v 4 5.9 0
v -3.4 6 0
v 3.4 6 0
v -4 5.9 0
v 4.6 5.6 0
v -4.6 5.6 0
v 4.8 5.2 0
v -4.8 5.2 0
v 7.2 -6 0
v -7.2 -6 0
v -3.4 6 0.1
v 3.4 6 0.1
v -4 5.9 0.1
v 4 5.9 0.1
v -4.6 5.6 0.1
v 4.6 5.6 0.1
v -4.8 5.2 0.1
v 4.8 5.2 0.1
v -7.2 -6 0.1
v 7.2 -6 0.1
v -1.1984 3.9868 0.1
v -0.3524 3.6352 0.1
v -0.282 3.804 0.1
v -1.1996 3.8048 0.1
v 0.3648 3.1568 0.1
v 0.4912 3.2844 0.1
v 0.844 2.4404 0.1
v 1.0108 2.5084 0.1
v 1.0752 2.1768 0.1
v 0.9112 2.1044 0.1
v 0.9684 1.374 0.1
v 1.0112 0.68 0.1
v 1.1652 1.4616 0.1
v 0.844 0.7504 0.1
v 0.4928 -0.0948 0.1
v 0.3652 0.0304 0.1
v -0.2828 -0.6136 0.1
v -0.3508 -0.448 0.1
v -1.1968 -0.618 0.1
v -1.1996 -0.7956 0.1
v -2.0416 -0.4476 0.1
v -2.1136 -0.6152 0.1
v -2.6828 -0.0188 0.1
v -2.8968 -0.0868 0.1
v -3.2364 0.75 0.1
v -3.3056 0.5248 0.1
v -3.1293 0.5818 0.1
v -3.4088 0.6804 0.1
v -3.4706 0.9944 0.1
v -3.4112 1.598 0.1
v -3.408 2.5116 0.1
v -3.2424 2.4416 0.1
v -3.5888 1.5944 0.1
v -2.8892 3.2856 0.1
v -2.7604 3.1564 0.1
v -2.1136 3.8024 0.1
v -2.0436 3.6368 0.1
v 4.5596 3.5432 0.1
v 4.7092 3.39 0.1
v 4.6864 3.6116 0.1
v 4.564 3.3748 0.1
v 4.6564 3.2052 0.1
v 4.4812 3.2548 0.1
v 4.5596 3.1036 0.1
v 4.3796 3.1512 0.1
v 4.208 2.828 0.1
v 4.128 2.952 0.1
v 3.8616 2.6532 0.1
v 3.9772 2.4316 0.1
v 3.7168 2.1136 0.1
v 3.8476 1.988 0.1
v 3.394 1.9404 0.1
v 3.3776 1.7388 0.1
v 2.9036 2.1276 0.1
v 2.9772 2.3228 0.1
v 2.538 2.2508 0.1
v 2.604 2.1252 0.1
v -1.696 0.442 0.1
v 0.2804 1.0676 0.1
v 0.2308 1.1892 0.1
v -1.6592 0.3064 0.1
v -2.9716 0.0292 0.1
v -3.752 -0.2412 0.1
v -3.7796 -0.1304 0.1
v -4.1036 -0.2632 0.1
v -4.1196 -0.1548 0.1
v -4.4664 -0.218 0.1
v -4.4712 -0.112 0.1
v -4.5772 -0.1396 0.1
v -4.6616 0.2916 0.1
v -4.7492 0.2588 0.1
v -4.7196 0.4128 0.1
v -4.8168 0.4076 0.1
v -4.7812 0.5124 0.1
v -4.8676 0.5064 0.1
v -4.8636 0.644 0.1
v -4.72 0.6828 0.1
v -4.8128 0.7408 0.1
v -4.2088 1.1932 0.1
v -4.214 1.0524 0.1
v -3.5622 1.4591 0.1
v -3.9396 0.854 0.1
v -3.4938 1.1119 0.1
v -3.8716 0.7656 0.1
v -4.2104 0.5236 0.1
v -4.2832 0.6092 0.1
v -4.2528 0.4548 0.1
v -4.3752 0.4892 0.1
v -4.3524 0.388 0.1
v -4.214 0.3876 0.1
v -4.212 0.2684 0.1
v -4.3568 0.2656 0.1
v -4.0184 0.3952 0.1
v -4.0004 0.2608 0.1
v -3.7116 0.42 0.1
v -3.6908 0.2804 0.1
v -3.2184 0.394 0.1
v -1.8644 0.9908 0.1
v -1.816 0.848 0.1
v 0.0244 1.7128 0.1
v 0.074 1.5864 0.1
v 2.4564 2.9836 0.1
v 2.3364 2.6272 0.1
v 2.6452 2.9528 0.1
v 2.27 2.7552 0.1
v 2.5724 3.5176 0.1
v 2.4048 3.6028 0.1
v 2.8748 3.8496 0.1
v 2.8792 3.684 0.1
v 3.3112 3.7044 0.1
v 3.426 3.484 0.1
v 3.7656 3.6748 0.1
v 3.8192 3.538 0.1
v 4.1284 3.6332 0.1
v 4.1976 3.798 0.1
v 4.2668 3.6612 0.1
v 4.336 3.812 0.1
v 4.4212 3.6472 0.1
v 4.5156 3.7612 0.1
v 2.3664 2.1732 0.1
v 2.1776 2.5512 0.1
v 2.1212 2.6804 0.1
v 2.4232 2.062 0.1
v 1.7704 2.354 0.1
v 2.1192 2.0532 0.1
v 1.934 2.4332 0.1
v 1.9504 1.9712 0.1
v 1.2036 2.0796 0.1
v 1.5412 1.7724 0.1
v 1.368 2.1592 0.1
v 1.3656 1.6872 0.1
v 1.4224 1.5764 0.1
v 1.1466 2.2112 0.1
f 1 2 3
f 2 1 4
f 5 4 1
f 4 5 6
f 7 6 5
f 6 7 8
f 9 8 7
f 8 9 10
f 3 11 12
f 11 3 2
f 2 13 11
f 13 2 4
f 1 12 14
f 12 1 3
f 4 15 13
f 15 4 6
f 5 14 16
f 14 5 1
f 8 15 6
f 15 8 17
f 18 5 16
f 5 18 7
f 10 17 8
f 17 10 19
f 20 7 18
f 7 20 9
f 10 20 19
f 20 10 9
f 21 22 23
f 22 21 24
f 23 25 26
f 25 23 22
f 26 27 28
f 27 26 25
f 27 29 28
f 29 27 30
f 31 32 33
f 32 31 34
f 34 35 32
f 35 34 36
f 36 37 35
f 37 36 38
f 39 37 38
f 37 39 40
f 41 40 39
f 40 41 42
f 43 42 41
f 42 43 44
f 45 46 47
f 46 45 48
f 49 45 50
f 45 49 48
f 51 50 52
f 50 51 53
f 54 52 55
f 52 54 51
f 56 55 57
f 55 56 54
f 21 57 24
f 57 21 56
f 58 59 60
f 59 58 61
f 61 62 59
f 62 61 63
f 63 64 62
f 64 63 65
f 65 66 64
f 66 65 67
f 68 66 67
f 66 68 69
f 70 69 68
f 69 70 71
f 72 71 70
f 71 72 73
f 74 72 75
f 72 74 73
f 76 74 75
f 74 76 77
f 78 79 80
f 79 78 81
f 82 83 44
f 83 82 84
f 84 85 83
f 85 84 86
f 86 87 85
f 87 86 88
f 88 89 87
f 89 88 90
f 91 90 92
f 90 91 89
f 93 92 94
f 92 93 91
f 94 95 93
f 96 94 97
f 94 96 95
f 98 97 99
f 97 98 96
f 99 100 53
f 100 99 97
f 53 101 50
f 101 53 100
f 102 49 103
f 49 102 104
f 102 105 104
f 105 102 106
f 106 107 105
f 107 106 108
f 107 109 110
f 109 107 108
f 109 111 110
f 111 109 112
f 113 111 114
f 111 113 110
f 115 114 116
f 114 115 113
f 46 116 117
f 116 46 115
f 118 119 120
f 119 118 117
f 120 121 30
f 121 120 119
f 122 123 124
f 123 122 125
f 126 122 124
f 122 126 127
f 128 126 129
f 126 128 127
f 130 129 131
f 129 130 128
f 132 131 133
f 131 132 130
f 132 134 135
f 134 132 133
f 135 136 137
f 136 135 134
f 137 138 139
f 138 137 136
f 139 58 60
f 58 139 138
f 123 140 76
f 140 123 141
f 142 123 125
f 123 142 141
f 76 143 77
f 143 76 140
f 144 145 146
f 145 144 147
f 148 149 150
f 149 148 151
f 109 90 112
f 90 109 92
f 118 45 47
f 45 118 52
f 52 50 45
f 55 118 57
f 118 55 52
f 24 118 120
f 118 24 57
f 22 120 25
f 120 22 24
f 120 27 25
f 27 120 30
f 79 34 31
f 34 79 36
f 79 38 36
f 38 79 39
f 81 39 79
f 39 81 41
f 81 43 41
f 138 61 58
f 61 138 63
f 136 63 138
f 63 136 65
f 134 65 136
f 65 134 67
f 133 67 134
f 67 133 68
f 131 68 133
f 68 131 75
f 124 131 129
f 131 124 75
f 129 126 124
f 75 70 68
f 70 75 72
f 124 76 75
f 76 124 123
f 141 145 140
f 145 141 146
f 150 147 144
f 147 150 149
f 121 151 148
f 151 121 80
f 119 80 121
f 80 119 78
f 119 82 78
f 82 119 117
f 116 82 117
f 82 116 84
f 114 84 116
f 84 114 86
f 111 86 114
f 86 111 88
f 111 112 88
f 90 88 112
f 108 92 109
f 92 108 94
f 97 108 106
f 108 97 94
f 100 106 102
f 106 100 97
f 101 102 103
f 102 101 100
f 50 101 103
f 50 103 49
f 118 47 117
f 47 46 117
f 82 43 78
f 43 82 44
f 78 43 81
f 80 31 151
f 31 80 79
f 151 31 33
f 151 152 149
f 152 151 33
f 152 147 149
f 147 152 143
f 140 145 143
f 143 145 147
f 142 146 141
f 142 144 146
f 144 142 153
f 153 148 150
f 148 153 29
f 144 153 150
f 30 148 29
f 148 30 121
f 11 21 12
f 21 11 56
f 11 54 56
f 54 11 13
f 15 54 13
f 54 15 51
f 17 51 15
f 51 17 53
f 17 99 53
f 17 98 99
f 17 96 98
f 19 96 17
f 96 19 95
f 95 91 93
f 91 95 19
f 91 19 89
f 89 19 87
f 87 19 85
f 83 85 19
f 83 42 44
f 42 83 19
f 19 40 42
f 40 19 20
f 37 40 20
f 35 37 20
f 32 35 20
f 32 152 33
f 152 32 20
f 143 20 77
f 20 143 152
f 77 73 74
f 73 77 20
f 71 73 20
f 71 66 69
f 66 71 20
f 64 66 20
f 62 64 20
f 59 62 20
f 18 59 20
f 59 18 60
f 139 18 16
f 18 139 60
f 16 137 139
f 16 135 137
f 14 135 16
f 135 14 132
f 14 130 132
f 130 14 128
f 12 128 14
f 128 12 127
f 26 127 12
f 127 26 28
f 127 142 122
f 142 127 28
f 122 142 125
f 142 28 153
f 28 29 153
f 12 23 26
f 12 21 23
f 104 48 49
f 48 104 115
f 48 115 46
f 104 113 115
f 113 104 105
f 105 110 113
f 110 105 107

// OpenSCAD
// file: s/004315s01.scad
use <../../lib.scad>
function ldraw_lib__s__004315s01() = [
// 0 ~Sticker for Minifig Torso without Top Surface
// 0 Name: s\004315s01.dat
// 0 Author: Michael Heidemann [mikeheide]
// 0 !LDRAW_ORG Subpart UPDATE 2018-02
// 0 !LICENSE Licensed under CC BY 2.0 and CC BY 4.0 : see CAreadme.txt
// 
// 0 BFC CERTIFY CCW
  [0,"BFC","CERTIFY"],
  [0,"BFC","CCW"],
// 
// 0 !HISTORY 2011-12-29 [PTadmin] Official Update 2011-02
// 0 !HISTORY 2017-07-04 [cwdee] Add conditional lines in border
// 0 !HISTORY 2018-12-08 [PTadmin] Official Update 2018-02
// 
// 
// 0 // Back
// 
// 4 16 8.5 0 15 10 0 14.75 -10 0 14.75 -8.5 0 15
  [4,16,8.5,0,15,10,0,14.75,-10,0,14.75,-8.5,0,15],
// 4 16 10 0 14.75 11.5 0 14 -11.5 0 14 -10 0 14.75
  [4,16,10,0,14.75,11.5,0,14,-11.5,0,14,-10,0,14.75],
// 4 16 11.5 0 14 12 0 13 -12 0 13 -11.5 0 14
  [4,16,11.5,0,14,12,0,13,-12,0,13,-11.5,0,14],
// 4 16 12 0 13 18 0 -15 -18 0 -15 -12 0 13
  [4,16,12,0,13,18,0,-15,-18,0,-15,-12,0,13],
// 0 // Border
// 4 16 8.5 0 15 -8.5 0 15 -8.5 -0.25 15 8.5 -0.25 15
  [4,16,8.5,0,15,-8.5,0,15,-8.5,-0.25,15,8.5,-0.25,15],
// 4 16 -8.5 0 15 -10 0 14.75 -10 -0.25 14.75 -8.5 -0.25 15
  [4,16,-8.5,0,15,-10,0,14.75,-10,-0.25,14.75,-8.5,-0.25,15],
// 4 16 8.5 -0.25 15 10 -0.25 14.75 10 0 14.75 8.5 0 15
  [4,16,8.5,-0.25,15,10,-0.25,14.75,10,0,14.75,8.5,0,15],
// 4 16 -10 0 14.75 -11.5 0 14 -11.5 -0.25 14 -10 -0.25 14.75
  [4,16,-10,0,14.75,-11.5,0,14,-11.5,-0.25,14,-10,-0.25,14.75],
// 4 16 10 -0.25 14.75 11.5 -0.25 14 11.5 0 14 10 0 14.75
  [4,16,10,-0.25,14.75,11.5,-0.25,14,11.5,0,14,10,0,14.75],
// 4 16 -11.5 0 14 -12 0 13 -12 -0.25 13 -11.5 -0.25 14
  [4,16,-11.5,0,14,-12,0,13,-12,-0.25,13,-11.5,-0.25,14],
// 4 16 11.5 -0.25 14 12 -0.25 13 12 0 13 11.5 0 14
  [4,16,11.5,-0.25,14,12,-0.25,13,12,0,13,11.5,0,14],
// 4 16 -18 -0.25 -15 -12 -0.25 13 -12 0 13 -18 0 -15
  [4,16,-18,-0.25,-15,-12,-0.25,13,-12,0,13,-18,0,-15],
// 4 16 18 0 -15 12 0 13 12 -0.25 13 18 -0.25 -15
  [4,16,18,0,-15,12,0,13,12,-0.25,13,18,-0.25,-15],
// 4 16 -18 0 -15 18 0 -15 18 -0.25 -15 -18 -0.25 -15
  [4,16,-18,0,-15,18,0,-15,18,-0.25,-15,-18,-0.25,-15],
// 0 // Border conditional lines
// 5 24 8.5 0 15 8.5 -0.25 15 0 0 15 10 0 14.75
  [5,24,8.5,0,15,8.5,-0.25,15,0,0,15,10,0,14.75],
// 5 24 10 0 14.75 10 -0.25 14.75 8.5 0 15 11.5 0 14
  [5,24,10,0,14.75,10,-0.25,14.75,8.5,0,15,11.5,0,14],
// 5 24 11.5 0 14 11.5 -0.25 14 10 0 14.75 12 0 13
  [5,24,11.5,0,14,11.5,-0.25,14,10,0,14.75,12,0,13],
// 5 24 12 0 13 12 -0.25 13 11.5 0 14 18 0 -15
  [5,24,12,0,13,12,-0.25,13,11.5,0,14,18,0,-15],
// 5 24 -8.5 0 15 -8.5 -0.25 15 0 0 15 -10 0 14.75
  [5,24,-8.5,0,15,-8.5,-0.25,15,0,0,15,-10,0,14.75],
// 5 24 -10 0 14.75 -10 -0.25 14.75 -8.5 0 15 -11.5 0 14
  [5,24,-10,0,14.75,-10,-0.25,14.75,-8.5,0,15,-11.5,0,14],
// 5 24 -11.5 0 14 -11.5 -0.25 14 -10 0 14.75 -12 0 13
  [5,24,-11.5,0,14,-11.5,-0.25,14,-10,0,14.75,-12,0,13],
// 5 24 -12 0 13 -12 -0.25 13 -11.5 0 14 -18 0 -15
  [5,24,-12,0,13,-12,-0.25,13,-11.5,0,14,-18,0,-15],
];
makepoly(ldraw_lib__s__004315s01(), line=0.2);
// main file
use <../lib.scad>
use <s/004315s01.scad>
function ldraw_lib__199014a() = [
// 0 Sticker Minifig Torso with Classic Space Logo on Red Background
// 0 Name: 199014a.dat
// 0 Author: Takeshi Takahashi [RainbowDolphin]
// 0 !LDRAW_ORG Part UPDATE 2022-01
// 0 !LICENSE Licensed under CC BY 2.0 and CC BY 4.0 : see CAreadme.txt
// 
// 0 BFC CERTIFY CCW
  [0,"BFC","CERTIFY"],
  [0,"BFC","CCW"],
// 
// 0 !KEYWORDS Set 926
// 
// 0 !HISTORY 2022-01-14 [PTadmin] Official Update 2022-01
// 
// 
// 1 16 0 0 0 1 0 0 0 1 0 0 0 1 s\004315s01.dat
  [1,16,0,0,0,1,0,0,0,1,0,0,0,1, ldraw_lib__s__004315s01()],
// 4 15 -.881 -.25 9.088 -.705 -.25 9.51 -2.996 -.25 9.967 -2.999 -.25 9.512
  [4,15,-.881,-.25,9.088,-.705,-.25,9.51,-2.996,-.25,9.967,-2.999,-.25,9.512],
// 4 15 .912 -.25 7.892 1.228 -.25 8.211 -.705 -.25 9.51 -.881 -.25 9.088
  [4,15,.912,-.25,7.892,1.228,-.25,8.211,-.705,-.25,9.51,-.881,-.25,9.088],
// 4 15 2.11 -.25 6.101 2.527 -.25 6.271 1.228 -.25 8.211 .912 -.25 7.892
  [4,15,2.11,-.25,6.101,2.527,-.25,6.271,1.228,-.25,8.211,.912,-.25,7.892],
// 4 15 2.278 -.25 5.261 2.688 -.25 5.442 2.527 -.25 6.271 2.11 -.25 6.101
  [4,15,2.278,-.25,5.261,2.688,-.25,5.442,2.527,-.25,6.271,2.11,-.25,6.101],
// 4 15 2.11 -.25 1.876 2.528 -.25 1.7 2.913 -.25 3.654 2.421 -.25 3.435
  [4,15,2.11,-.25,1.876,2.528,-.25,1.7,2.913,-.25,3.654,2.421,-.25,3.435],
// 4 15 1.232 -.25 -.237 2.528 -.25 1.7 2.11 -.25 1.876 .913 -.25 .076
  [4,15,1.232,-.25,-.237,2.528,-.25,1.7,2.11,-.25,1.876,.913,-.25,.076],
// 4 15 -.707 -.25 -1.534 1.232 -.25 -.237 .913 -.25 .076 -.877 -.25 -1.12
  [4,15,-.707,-.25,-1.534,1.232,-.25,-.237,.913,-.25,.076,-.877,-.25,-1.12],
// 4 15 -2.999 -.25 -1.989 -.707 -.25 -1.534 -.877 -.25 -1.12 -2.992 -.25 -1.545
  [4,15,-2.999,-.25,-1.989,-.707,-.25,-1.534,-.877,-.25,-1.12,-2.992,-.25,-1.545],
// 4 15 -2.999 -.25 -1.989 -2.992 -.25 -1.545 -5.104 -.25 -1.119 -5.284 -.25 -1.538
  [4,15,-2.999,-.25,-1.989,-2.992,-.25,-1.545,-5.104,-.25,-1.119,-5.284,-.25,-1.538],
// 4 15 -5.284 -.25 -1.538 -5.104 -.25 -1.119 -6.707 -.25 -.047 -7.242 -.25 -.217
  [4,15,-5.284,-.25,-1.538,-5.104,-.25,-1.119,-6.707,-.25,-.047,-7.242,-.25,-.217],
// 4 15 -8.264 -.25 1.312 -7.8232 -.25 1.4545 -8.091 -.25 1.875 -8.522 -.25 1.701
  [4,15,-8.264,-.25,1.312,-7.8232,-.25,1.4545,-8.091,-.25,1.875,-8.522,-.25,1.701],
// 4 15 -8.522 -.25 1.701 -8.091 -.25 1.875 -8.528 -.25 3.995 -8.6766 -.25 2.4859
  [4,15,-8.522,-.25,1.701,-8.091,-.25,1.875,-8.528,-.25,3.995,-8.6766,-.25,2.4859],
// 4 15 -8.528 -.25 3.995 -8.106 -.25 6.104 -8.52 -.25 6.279 -8.972 -.25 3.986
  [4,15,-8.528,-.25,3.995,-8.106,-.25,6.104,-8.52,-.25,6.279,-8.972,-.25,3.986],
// 4 15 -8.106 -.25 6.104 -6.901 -.25 7.891 -7.223 -.25 8.214 -8.52 -.25 6.279
  [4,15,-8.106,-.25,6.104,-6.901,-.25,7.891,-7.223,-.25,8.214,-8.52,-.25,6.279],
// 4 15 -6.901 -.25 7.891 -5.109 -.25 9.092 -5.284 -.25 9.506 -7.223 -.25 8.214
  [4,15,-6.901,-.25,7.891,-5.109,-.25,9.092,-5.284,-.25,9.506,-7.223,-.25,8.214],
// 4 15 -5.109 -.25 9.092 -2.999 -.25 9.512 -2.996 -.25 9.967 -5.284 -.25 9.506
  [4,15,-5.109,-.25,9.092,-2.999,-.25,9.512,-2.996,-.25,9.967,-5.284,-.25,9.506],
// 4 15 11.41 -.25 8.437 11.773 -.25 8.475 11.716 -.25 9.029 11.399 -.25 8.858
  [4,15,11.41,-.25,8.437,11.773,-.25,8.475,11.716,-.25,9.029,11.399,-.25,8.858],
// 4 15 11.203 -.25 8.137 11.641 -.25 8.013 11.773 -.25 8.475 11.41 -.25 8.437
  [4,15,11.203,-.25,8.137,11.641,-.25,8.013,11.773,-.25,8.475,11.41,-.25,8.437],
// 4 15 11.399 -.25 7.759 11.641 -.25 8.013 11.203 -.25 8.137 10.949 -.25 7.878
  [4,15,11.399,-.25,7.759,11.641,-.25,8.013,11.203,-.25,8.137,10.949,-.25,7.878],
// 4 15 10.52 -.25 7.07 11.399 -.25 7.759 10.949 -.25 7.878 10.32 -.25 7.38
  [4,15,10.52,-.25,7.07,11.399,-.25,7.759,10.949,-.25,7.878,10.32,-.25,7.38],
// 4 15 9.943 -.25 6.079 10.52 -.25 7.07 10.32 -.25 7.38 9.654 -.25 6.633
  [4,15,9.943,-.25,6.079,10.52,-.25,7.07,10.32,-.25,7.38,9.654,-.25,6.633],
// 4 15 9.619 -.25 4.97 9.943 -.25 6.079 9.654 -.25 6.633 9.292 -.25 5.284
  [4,15,9.619,-.25,4.97,9.943,-.25,6.079,9.654,-.25,6.633,9.292,-.25,5.284],
// 4 15 8.444 -.25 4.347 9.619 -.25 4.97 9.292 -.25 5.284 8.485 -.25 4.851
  [4,15,8.444,-.25,4.347,9.619,-.25,4.97,9.292,-.25,5.284,8.485,-.25,4.851],
// 4 15 8.444 -.25 4.347 8.485 -.25 4.851 7.443 -.25 5.807 7.259 -.25 5.319
  [4,15,8.444,-.25,4.347,8.485,-.25,4.851,7.443,-.25,5.807,7.259,-.25,5.319],
// 4 15 6.51 -.25 5.313 7.259 -.25 5.319 7.443 -.25 5.807 6.345 -.25 5.627
  [4,15,6.51,-.25,5.313,7.259,-.25,5.319,7.443,-.25,5.807,6.345,-.25,5.627],
// 4 15 -4.148 -.25 .766 .701 -.25 2.669 .577 -.25 2.973 -4.24 -.25 1.105
  [4,15,-4.148,-.25,.766,.701,-.25,2.669,.577,-.25,2.973,-4.24,-.25,1.105],
// 4 15 -9.38 -.25 -.603 -7.242 -.25 -.217 -7.429 -.25 .073 -9.449 -.25 -.326
  [4,15,-9.38,-.25,-.603,-7.242,-.25,-.217,-7.429,-.25,.073,-9.449,-.25,-.326],
// 4 15 -10.259 -.25 -.658 -9.38 -.25 -.603 -9.449 -.25 -.326 -10.299 -.25 -.387
  [4,15,-10.259,-.25,-.658,-9.38,-.25,-.603,-9.449,-.25,-.326,-10.299,-.25,-.387],
// 4 15 -10.259 -.25 -.658 -10.299 -.25 -.387 -11.178 -.25 -.28 -11.166 -.25 -.545
  [4,15,-10.259,-.25,-.658,-10.299,-.25,-.387,-11.178,-.25,-.28,-11.166,-.25,-.545],
// 4 15 -11.443 -.25 -.349 -11.166 -.25 -.545 -11.178 -.25 -.28 -11.654 -.25 .729
  [4,15,-11.443,-.25,-.349,-11.166,-.25,-.545,-11.178,-.25,-.28,-11.654,-.25,.729],
// 4 15 -11.873 -.25 .647 -11.443 -.25 -.349 -11.654 -.25 .729 -11.799 -.25 1.032
  [4,15,-11.873,-.25,.647,-11.443,-.25,-.349,-11.654,-.25,.729,-11.799,-.25,1.032],
// 4 15 -12.042 -.25 1.019 -11.873 -.25 .647 -11.799 -.25 1.032 -11.953 -.25 1.281
  [4,15,-12.042,-.25,1.019,-11.873,-.25,.647,-11.799,-.25,1.032,-11.953,-.25,1.281],
// 3 15 -11.953 -.25 1.281 -12.169 -.25 1.266 -12.042 -.25 1.019
  [3,15,-11.953,-.25,1.281,-12.169,-.25,1.266,-12.042,-.25,1.019],
// 4 15 -12.169 -.25 1.266 -11.953 -.25 1.281 -11.8 -.25 1.707 -12.159 -.25 1.61
  [4,15,-12.169,-.25,1.266,-11.953,-.25,1.281,-11.8,-.25,1.707,-12.159,-.25,1.61],
// 4 15 -12.032 -.25 1.852 -12.159 -.25 1.61 -11.8 -.25 1.707 -10.522 -.25 2.983
  [4,15,-12.032,-.25,1.852,-12.159,-.25,1.61,-11.8,-.25,1.707,-10.522,-.25,2.983],
// 4 15 -10.522 -.25 2.983 -11.8 -.25 1.707 -10.535 -.25 2.631 -8.972 -.25 3.986
  [4,15,-10.522,-.25,2.983,-11.8,-.25,1.707,-10.535,-.25,2.631,-8.972,-.25,3.986],
// 4 15 -8.972 -.25 3.986 -10.535 -.25 2.631 -8.9054 -.25 3.6477 -8.528 -.25 3.995
  [4,15,-8.972,-.25,3.986,-10.535,-.25,2.631,-8.9054,-.25,3.6477,-8.528,-.25,3.995],
// 4 15 -9.679 -.25 1.914 -8.6766 -.25 2.4859 -8.7344 -.25 2.7797 -9.849 -.25 2.135
  [4,15,-9.679,-.25,1.914,-8.6766,-.25,2.4859,-8.7344,-.25,2.7797,-9.849,-.25,2.135],
// 4 15 -10.526 -.25 1.309 -9.679 -.25 1.914 -9.849 -.25 2.135 -10.708 -.25 1.523
  [4,15,-10.526,-.25,1.309,-9.679,-.25,1.914,-9.849,-.25,2.135,-10.708,-.25,1.523],
// 4 15 -10.632 -.25 1.137 -10.526 -.25 1.309 -10.708 -.25 1.523 -10.938 -.25 1.223
  [4,15,-10.632,-.25,1.137,-10.526,-.25,1.309,-10.708,-.25,1.523,-10.938,-.25,1.223],
// 4 15 -10.535 -.25 .969 -10.632 -.25 1.137 -10.938 -.25 1.223 -10.881 -.25 .97
  [4,15,-10.535,-.25,.969,-10.632,-.25,1.137,-10.938,-.25,1.223,-10.881,-.25,.97],
// 4 15 -10.892 -.25 .664 -10.53 -.25 .671 -10.535 -.25 .969 -10.881 -.25 .97
  [4,15,-10.892,-.25,.664,-10.53,-.25,.671,-10.535,-.25,.969,-10.881,-.25,.97],
// 4 15 -10.53 -.25 .671 -10.001 -.25 .652 -10.046 -.25 .988 -10.535 -.25 .969
  [4,15,-10.53,-.25,.671,-10.001,-.25,.652,-10.046,-.25,.988,-10.535,-.25,.969],
// 4 15 -10.001 -.25 .652 -9.227 -.25 .701 -9.279 -.25 1.05 -10.046 -.25 .988
  [4,15,-10.001,-.25,.652,-9.227,-.25,.701,-9.279,-.25,1.05,-10.046,-.25,.988],
// 4 15 -9.227 -.25 .701 -8.046 -.25 .985 -8.264 -.25 1.312 -9.279 -.25 1.05
  [4,15,-9.227,-.25,.701,-8.046,-.25,.985,-8.264,-.25,1.312,-9.279,-.25,1.05],
// 4 15 -4.661 -.25 2.477 -8.046 -.25 .985 -4.54 -.25 2.12 .061 -.25 4.282
  [4,15,-4.661,-.25,2.477,-8.046,-.25,.985,-4.54,-.25,2.12,.061,-.25,4.282],
// 4 15 .061 -.25 4.282 -4.54 -.25 2.12 .185 -.25 3.966 2.278 -.25 5.261
  [4,15,.061,-.25,4.282,-4.54,-.25,2.12,.185,-.25,3.966,2.278,-.25,5.261],
// 4 15 5.841 -.25 6.568 6.613 -.25 7.382 6.141 -.25 7.459 5.675 -.25 6.888
  [4,15,5.841,-.25,6.568,6.613,-.25,7.382,6.141,-.25,7.459,5.675,-.25,6.888],
// 4 15 6.613 -.25 7.382 6.431 -.25 8.794 6.012 -.25 9.007 6.141 -.25 7.459
  [4,15,6.613,-.25,7.382,6.431,-.25,8.794,6.012,-.25,9.007,6.141,-.25,7.459],
// 4 15 6.431 -.25 8.794 7.198 -.25 9.21 7.187 -.25 9.624 6.012 -.25 9.007
  [4,15,6.431,-.25,8.794,7.198,-.25,9.21,7.187,-.25,9.624,6.012,-.25,9.007],
// 4 15 8.565 -.25 8.71 8.278 -.25 9.261 7.187 -.25 9.624 7.198 -.25 9.21
  [4,15,8.565,-.25,8.71,8.278,-.25,9.261,7.187,-.25,9.624,7.198,-.25,9.21],
// 4 15 9.548 -.25 8.845 9.414 -.25 9.187 8.278 -.25 9.261 8.565 -.25 8.71
  [4,15,9.548,-.25,8.845,9.414,-.25,9.187,8.278,-.25,9.261,8.565,-.25,8.71],
// 4 15 9.548 -.25 8.845 10.321 -.25 9.083 10.494 -.25 9.495 9.414 -.25 9.187
  [4,15,9.548,-.25,8.845,10.321,-.25,9.083,10.494,-.25,9.495,9.414,-.25,9.187],
// 4 15 10.321 -.25 9.083 10.667 -.25 9.153 10.84 -.25 9.53 10.494 -.25 9.495
  [4,15,10.321,-.25,9.083,10.667,-.25,9.153,10.84,-.25,9.53,10.494,-.25,9.495],
// 4 15 11.053 -.25 9.118 11.289 -.25 9.403 10.84 -.25 9.53 10.667 -.25 9.153
  [4,15,11.053,-.25,9.118,11.289,-.25,9.403,10.84,-.25,9.53,10.667,-.25,9.153],
// 4 15 11.399 -.25 8.858 11.716 -.25 9.029 11.289 -.25 9.403 11.053 -.25 9.118
  [4,15,11.399,-.25,8.858,11.716,-.25,9.029,11.289,-.25,9.403,11.053,-.25,9.118],
// 4 15 5.916 -.25 5.433 6.345 -.25 5.627 5.841 -.25 6.568 5.444 -.25 6.378
  [4,15,5.916,-.25,5.433,6.345,-.25,5.627,5.841,-.25,6.568,5.444,-.25,6.378],
// 4 15 5.444 -.25 6.378 5.841 -.25 6.568 5.675 -.25 6.888 5.303 -.25 6.701
  [4,15,5.444,-.25,6.378,5.841,-.25,6.568,5.675,-.25,6.888,5.303,-.25,6.701],
// 4 15 6.058 -.25 5.155 6.51 -.25 5.313 6.345 -.25 5.627 5.916 -.25 5.433
  [4,15,6.058,-.25,5.155,6.51,-.25,5.313,6.345,-.25,5.627,5.916,-.25,5.433],
// 4 15 4.876 -.25 4.928 5.298 -.25 5.133 4.835 -.25 6.083 4.426 -.25 5.885
  [4,15,4.876,-.25,4.928,5.298,-.25,5.133,4.835,-.25,6.083,4.426,-.25,5.885],
// 4 15 3.414 -.25 4.218 3.853 -.25 4.431 3.42 -.25 5.398 3.009 -.25 5.199
  [4,15,3.414,-.25,4.218,3.853,-.25,4.431,3.42,-.25,5.398,3.009,-.25,5.199],
// 4 15 -10.892 -.25 .664 -10.881 -.25 .97 -11.799 -.25 1.032 -11.654 -.25 .729
  [4,15,-10.892,-.25,.664,-10.881,-.25,.97,-11.799,-.25,1.032,-11.654,-.25,.729],
// 4 82 -8.091 -.25 1.875 -7.8232 -.25 1.4545 -4.661 -.25 2.477 -8.106 -.25 6.104
  [4,82,-8.091,-.25,1.875,-7.8232,-.25,1.4545,-4.661,-.25,2.477,-8.106,-.25,6.104],
// 3 82 -8.106 -.25 6.104 -8.528 -.25 3.995 -8.091 -.25 1.875
  [3,82,-8.106,-.25,6.104,-8.528,-.25,3.995,-8.091,-.25,1.875],
// 4 82 -8.106 -.25 6.104 -4.661 -.25 2.477 -5.109 -.25 9.092 -6.901 -.25 7.891
  [4,82,-8.106,-.25,6.104,-4.661,-.25,2.477,-5.109,-.25,9.092,-6.901,-.25,7.891],
// 4 82 -4.661 -.25 2.477 .061 -.25 4.282 -2.999 -.25 9.512 -5.109 -.25 9.092
  [4,82,-4.661,-.25,2.477,.061,-.25,4.282,-2.999,-.25,9.512,-5.109,-.25,9.092],
// 4 82 .912 -.25 7.892 -.881 -.25 9.088 -2.999 -.25 9.512 .061 -.25 4.282
  [4,82,.912,-.25,7.892,-.881,-.25,9.088,-2.999,-.25,9.512,.061,-.25,4.282],
// 4 82 2.278 -.25 5.261 2.11 -.25 6.101 .912 -.25 7.892 .061 -.25 4.282
  [4,82,2.278,-.25,5.261,2.11,-.25,6.101,.912,-.25,7.892,.061,-.25,4.282],
// 4 82 .913 -.25 .076 2.11 -.25 1.876 2.421 -.25 3.435 .701 -.25 2.669
  [4,82,.913,-.25,.076,2.11,-.25,1.876,2.421,-.25,3.435,.701,-.25,2.669],
// 4 82 -.877 -.25 -1.12 .913 -.25 .076 .701 -.25 2.669 -2.992 -.25 -1.545
  [4,82,-.877,-.25,-1.12,.913,-.25,.076,.701,-.25,2.669,-2.992,-.25,-1.545],
// 4 82 -5.104 -.25 -1.119 -2.992 -.25 -1.545 .701 -.25 2.669 -4.148 -.25 .766
  [4,82,-5.104,-.25,-1.119,-2.992,-.25,-1.545,.701,-.25,2.669,-4.148,-.25,.766],
// 3 82 -4.148 -.25 .766 -6.707 -.25 -.047 -5.104 -.25 -1.119
  [3,82,-4.148,-.25,.766,-6.707,-.25,-.047,-5.104,-.25,-1.119],
// 4 4 11.41 -.25 8.437 11.399 -.25 8.858 11.053 -.25 9.118 11.203 -.25 8.137
  [4,4,11.41,-.25,8.437,11.399,-.25,8.858,11.053,-.25,9.118,11.203,-.25,8.137],
// 4 4 11.203 -.25 8.137 11.053 -.25 9.118 10.667 -.25 9.153 10.949 -.25 7.878
  [4,4,11.203,-.25,8.137,11.053,-.25,9.118,10.667,-.25,9.153,10.949,-.25,7.878],
// 4 4 10.949 -.25 7.878 10.667 -.25 9.153 10.321 -.25 9.083 10.32 -.25 7.38
  [4,4,10.949,-.25,7.878,10.667,-.25,9.153,10.321,-.25,9.083,10.32,-.25,7.38],
// 4 4 10.32 -.25 7.38 10.321 -.25 9.083 9.548 -.25 8.845 9.654 -.25 6.633
  [4,4,10.32,-.25,7.38,10.321,-.25,9.083,9.548,-.25,8.845,9.654,-.25,6.633],
// 4 4 9.654 -.25 6.633 9.548 -.25 8.845 8.565 -.25 8.71 7.443 -.25 5.807
  [4,4,9.654,-.25,6.633,9.548,-.25,8.845,8.565,-.25,8.71,7.443,-.25,5.807],
// 4 4 6.613 -.25 7.382 7.443 -.25 5.807 8.565 -.25 8.71 7.198 -.25 9.21
  [4,4,6.613,-.25,7.382,7.443,-.25,5.807,8.565,-.25,8.71,7.198,-.25,9.21],
// 3 4 7.198 -.25 9.21 6.431 -.25 8.794 6.613 -.25 7.382
  [3,4,7.198,-.25,9.21,6.431,-.25,8.794,6.613,-.25,7.382],
// 4 4 8.485 -.25 4.851 9.292 -.25 5.284 9.654 -.25 6.633 7.443 -.25 5.807
  [4,4,8.485,-.25,4.851,9.292,-.25,5.284,9.654,-.25,6.633,7.443,-.25,5.807],
// 4 4 6.345 -.25 5.627 7.443 -.25 5.807 6.613 -.25 7.382 5.841 -.25 6.568
  [4,4,6.345,-.25,5.627,7.443,-.25,5.807,6.613,-.25,7.382,5.841,-.25,6.568],
// 4 4 5.298 -.25 5.133 5.916 -.25 5.433 5.444 -.25 6.378 4.835 -.25 6.083
  [4,4,5.298,-.25,5.133,5.916,-.25,5.433,5.444,-.25,6.378,4.835,-.25,6.083],
// 4 4 3.853 -.25 4.431 4.876 -.25 4.928 4.426 -.25 5.885 3.42 -.25 5.398
  [4,4,3.853,-.25,4.431,4.876,-.25,4.928,4.426,-.25,5.885,3.42,-.25,5.398],
// 4 4 .577 -.25 2.973 3.414 -.25 4.218 3.009 -.25 5.199 .185 -.25 3.966
  [4,4,.577,-.25,2.973,3.414,-.25,4.218,3.009,-.25,5.199,.185,-.25,3.966],
// 4 4 -4.24 -.25 1.105 .577 -.25 2.973 .185 -.25 3.966 -4.54 -.25 2.12
  [4,4,-4.24,-.25,1.105,.577,-.25,2.973,.185,-.25,3.966,-4.54,-.25,2.12],
// 4 4 -7.429 -.25 .073 -4.24 -.25 1.105 -4.54 -.25 2.12 -8.046 -.25 .985
  [4,4,-7.429,-.25,.073,-4.24,-.25,1.105,-4.54,-.25,2.12,-8.046,-.25,.985],
// 4 4 -9.449 -.25 -.326 -7.429 -.25 .073 -8.046 -.25 .985 -9.227 -.25 .701
  [4,4,-9.449,-.25,-.326,-7.429,-.25,.073,-8.046,-.25,.985,-9.227,-.25,.701],
// 4 4 -10.299 -.25 -.387 -9.449 -.25 -.326 -9.227 -.25 .701 -10.001 -.25 .652
  [4,4,-10.299,-.25,-.387,-9.449,-.25,-.326,-9.227,-.25,.701,-10.001,-.25,.652],
// 4 4 -11.178 -.25 -.28 -10.299 -.25 -.387 -10.001 -.25 .652 -10.53 -.25 .671
  [4,4,-11.178,-.25,-.28,-10.299,-.25,-.387,-10.001,-.25,.652,-10.53,-.25,.671],
// 3 4 -10.53 -.25 .671 -10.892 -.25 .664 -11.178 -.25 -.28
  [3,4,-10.53,-.25,.671,-10.892,-.25,.664,-11.178,-.25,-.28],
// 3 4 -11.654 -.25 .729 -11.178 -.25 -.28 -10.892 -.25 .664
  [3,4,-11.654,-.25,.729,-11.178,-.25,-.28,-10.892,-.25,.664],
// 4 4 -10.881 -.25 .97 -10.938 -.25 1.223 -11.953 -.25 1.281 -11.799 -.25 1.032
  [4,4,-10.881,-.25,.97,-10.938,-.25,1.223,-11.953,-.25,1.281,-11.799,-.25,1.032],
// 4 4 -10.938 -.25 1.223 -10.708 -.25 1.523 -11.8 -.25 1.707 -11.953 -.25 1.281
  [4,4,-10.938,-.25,1.223,-10.708,-.25,1.523,-11.8,-.25,1.707,-11.953,-.25,1.281],
// 4 4 -10.708 -.25 1.523 -9.849 -.25 2.135 -10.535 -.25 2.631 -11.8 -.25 1.707
  [4,4,-10.708,-.25,1.523,-9.849,-.25,2.135,-10.535,-.25,2.631,-11.8,-.25,1.707],
// 4 4 -9.849 -.25 2.135 -8.7344 -.25 2.7797 -8.9054 -.25 3.6477 -10.535 -.25 2.631
  [4,4,-9.849,-.25,2.135,-8.7344,-.25,2.7797,-8.9054,-.25,3.6477,-10.535,-.25,2.631],
// 3 15 -8.528 -.25 3.995 -8.9054 -.25 3.6477 -8.7344 -.25 2.7797
  [3,15,-8.528,-.25,3.995,-8.9054,-.25,3.6477,-8.7344,-.25,2.7797],
// 3 15 -8.528 -.25 3.995 -8.7344 -.25 2.7797 -8.6766 -.25 2.4859
  [3,15,-8.528,-.25,3.995,-8.7344,-.25,2.7797,-8.6766,-.25,2.4859],
// 3 15 -4.661 -.25 2.477 -7.8232 -.25 1.4545 -8.046 -.25 .985
  [3,15,-4.661,-.25,2.477,-7.8232,-.25,1.4545,-8.046,-.25,.985],
// 3 15 -7.8232 -.25 1.4545 -8.264 -.25 1.312 -8.046 -.25 .985
  [3,15,-7.8232,-.25,1.4545,-8.264,-.25,1.312,-8.046,-.25,.985],
// 4 15 -7.429 -.25 .073 -7.242 -.25 -.217 -6.707 -.25 -.047 -4.24 -.25 1.105
  [4,15,-7.429,-.25,.073,-7.242,-.25,-.217,-6.707,-.25,-.047,-4.24,-.25,1.105],
// 3 15 -4.24 -.25 1.105 -6.707 -.25 -.047 -4.148 -.25 .766
  [3,15,-4.24,-.25,1.105,-6.707,-.25,-.047,-4.148,-.25,.766],
// 4 15 .577 -.25 2.973 .701 -.25 2.669 2.421 -.25 3.435 3.414 -.25 4.218
  [4,15,.577,-.25,2.973,.701,-.25,2.669,2.421,-.25,3.435,3.414,-.25,4.218],
// 3 15 3.414 -.25 4.218 2.421 -.25 3.435 2.913 -.25 3.654
  [3,15,3.414,-.25,4.218,2.421,-.25,3.435,2.913,-.25,3.654],
// 4 15 3.414 -.25 4.218 2.913 -.25 3.654 3.556 -.25 3.941 3.853 -.25 4.431
  [4,15,3.414,-.25,4.218,2.913,-.25,3.654,3.556,-.25,3.941,3.853,-.25,4.431],
// 4 15 4.876 -.25 4.928 3.853 -.25 4.431 3.556 -.25 3.941 6.058 -.25 5.155
  [4,15,4.876,-.25,4.928,3.853,-.25,4.431,3.556,-.25,3.941,6.058,-.25,5.155],
// 3 15 5.916 -.25 5.433 5.298 -.25 5.133 6.058 -.25 5.155
  [3,15,5.916,-.25,5.433,5.298,-.25,5.133,6.058,-.25,5.155],
// 3 15 6.058 -.25 5.155 5.298 -.25 5.133 4.876 -.25 4.928
  [3,15,6.058,-.25,5.155,5.298,-.25,5.133,4.876,-.25,4.928],
// 3 15 5.303 -.25 6.701 4.835 -.25 6.083 5.444 -.25 6.378
  [3,15,5.303,-.25,6.701,4.835,-.25,6.083,5.444,-.25,6.378],
// 4 15 4.426 -.25 5.885 4.835 -.25 6.083 5.303 -.25 6.701 2.8666 -.25 5.528
  [4,15,4.426,-.25,5.885,4.835,-.25,6.083,5.303,-.25,6.701,2.8666,-.25,5.528],
// 4 15 2.8666 -.25 5.528 2.688 -.25 5.442 3.009 -.25 5.199 3.42 -.25 5.398
  [4,15,2.8666,-.25,5.528,2.688,-.25,5.442,3.009,-.25,5.199,3.42,-.25,5.398],
// 3 15 4.426 -.25 5.885 2.8666 -.25 5.528 3.42 -.25 5.398
  [3,15,4.426,-.25,5.885,2.8666,-.25,5.528,3.42,-.25,5.398],
// 4 15 3.009 -.25 5.199 2.688 -.25 5.442 2.278 -.25 5.261 .185 -.25 3.966
  [4,15,3.009,-.25,5.199,2.688,-.25,5.442,2.278,-.25,5.261,.185,-.25,3.966],
// 4 4 -2.996 -.25 9.967 8.5 -.25 15 -8.5 -.25 15 -5.284 -.25 9.506
  [4,4,-2.996,-.25,9.967,8.5,-.25,15,-8.5,-.25,15,-5.284,-.25,9.506],
// 4 4 -5.284 -.25 9.506 -8.5 -.25 15 -10 -.25 14.75 -7.223 -.25 8.214
  [4,4,-5.284,-.25,9.506,-8.5,-.25,15,-10,-.25,14.75,-7.223,-.25,8.214],
// 4 4 -7.223 -.25 8.214 -10 -.25 14.75 -11.5 -.25 14 -8.52 -.25 6.279
  [4,4,-7.223,-.25,8.214,-10,-.25,14.75,-11.5,-.25,14,-8.52,-.25,6.279],
// 4 4 -8.52 -.25 6.279 -11.5 -.25 14 -12 -.25 13 -8.972 -.25 3.986
  [4,4,-8.52,-.25,6.279,-11.5,-.25,14,-12,-.25,13,-8.972,-.25,3.986],
// 3 4 -12 -.25 13 -10.522 -.25 2.983 -8.972 -.25 3.986
  [3,4,-12,-.25,13,-10.522,-.25,2.983,-8.972,-.25,3.986],
// 3 4 -12 -.25 13 -12.032 -.25 1.852 -10.522 -.25 2.983
  [3,4,-12,-.25,13,-12.032,-.25,1.852,-10.522,-.25,2.983],
// 3 4 -12 -.25 13 -12.159 -.25 1.61 -12.032 -.25 1.852
  [3,4,-12,-.25,13,-12.159,-.25,1.61,-12.032,-.25,1.852],
// 4 4 -12.159 -.25 1.61 -12 -.25 13 -18 -.25 -15 -12.169 -.25 1.266
  [4,4,-12.159,-.25,1.61,-12,-.25,13,-18,-.25,-15,-12.169,-.25,1.266],
// 4 4 -12.042 -.25 1.019 -12.169 -.25 1.266 -18 -.25 -15 -11.873 -.25 .647
  [4,4,-12.042,-.25,1.019,-12.169,-.25,1.266,-18,-.25,-15,-11.873,-.25,.647],
// 3 4 -11.873 -.25 .647 -18 -.25 -15 -11.443 -.25 -.349
  [3,4,-11.873,-.25,.647,-18,-.25,-15,-11.443,-.25,-.349],
// 3 4 -11.443 -.25 -.349 -18 -.25 -15 -11.166 -.25 -.545
  [3,4,-11.443,-.25,-.349,-18,-.25,-15,-11.166,-.25,-.545],
// 3 4 -11.166 -.25 -.545 -18 -.25 -15 -10.259 -.25 -.658
  [3,4,-11.166,-.25,-.545,-18,-.25,-15,-10.259,-.25,-.658],
// 3 4 -9.38 -.25 -.603 -10.259 -.25 -.658 -18 -.25 -15
  [3,4,-9.38,-.25,-.603,-10.259,-.25,-.658,-18,-.25,-15],
// 4 4 -7.242 -.25 -.217 -9.38 -.25 -.603 -18 -.25 -15 -5.284 -.25 -1.538
  [4,4,-7.242,-.25,-.217,-9.38,-.25,-.603,-18,-.25,-15,-5.284,-.25,-1.538],
// 4 4 -2.999 -.25 -1.989 -5.284 -.25 -1.538 -18 -.25 -15 18 -.25 -15
  [4,4,-2.999,-.25,-1.989,-5.284,-.25,-1.538,-18,-.25,-15,18,-.25,-15],
// 3 4 -.707 -.25 -1.534 -2.999 -.25 -1.989 18 -.25 -15
  [3,4,-.707,-.25,-1.534,-2.999,-.25,-1.989,18,-.25,-15],
// 3 4 1.232 -.25 -.237 -.707 -.25 -1.534 18 -.25 -15
  [3,4,1.232,-.25,-.237,-.707,-.25,-1.534,18,-.25,-15],
// 3 4 2.528 -.25 1.7 1.232 -.25 -.237 18 -.25 -15
  [3,4,2.528,-.25,1.7,1.232,-.25,-.237,18,-.25,-15],
// 4 4 2.913 -.25 3.654 2.528 -.25 1.7 18 -.25 -15 3.556 -.25 3.941
  [4,4,2.913,-.25,3.654,2.528,-.25,1.7,18,-.25,-15,3.556,-.25,3.941],
// 4 4 6.058 -.25 5.155 3.556 -.25 3.941 18 -.25 -15 6.51 -.25 5.313
  [4,4,6.058,-.25,5.155,3.556,-.25,3.941,18,-.25,-15,6.51,-.25,5.313],
// 4 4 7.259 -.25 5.319 6.51 -.25 5.313 18 -.25 -15 8.444 -.25 4.347
  [4,4,7.259,-.25,5.319,6.51,-.25,5.313,18,-.25,-15,8.444,-.25,4.347],
// 3 4 9.619 -.25 4.97 8.444 -.25 4.347 18 -.25 -15
  [3,4,9.619,-.25,4.97,8.444,-.25,4.347,18,-.25,-15],
// 4 4 9.943 -.25 6.079 9.619 -.25 4.97 18 -.25 -15 10.52 -.25 7.07
  [4,4,9.943,-.25,6.079,9.619,-.25,4.97,18,-.25,-15,10.52,-.25,7.07],
// 3 4 11.399 -.25 7.759 10.52 -.25 7.07 18 -.25 -15
  [3,4,11.399,-.25,7.759,10.52,-.25,7.07,18,-.25,-15],
// 3 4 11.641 -.25 8.013 11.399 -.25 7.759 18 -.25 -15
  [3,4,11.641,-.25,8.013,11.399,-.25,7.759,18,-.25,-15],
// 3 4 11.773 -.25 8.475 11.641 -.25 8.013 18 -.25 -15
  [3,4,11.773,-.25,8.475,11.641,-.25,8.013,18,-.25,-15],
// 4 4 11.773 -.25 8.475 18 -.25 -15 12 -.25 13 11.716 -.25 9.029
  [4,4,11.773,-.25,8.475,18,-.25,-15,12,-.25,13,11.716,-.25,9.029],
// 4 4 11.289 -.25 9.403 11.716 -.25 9.029 12 -.25 13 11.5 -.25 14
  [4,4,11.289,-.25,9.403,11.716,-.25,9.029,12,-.25,13,11.5,-.25,14],
// 3 4 11.5 -.25 14 10.84 -.25 9.53 11.289 -.25 9.403
  [3,4,11.5,-.25,14,10.84,-.25,9.53,11.289,-.25,9.403],
// 3 4 11.5 -.25 14 10.494 -.25 9.495 10.84 -.25 9.53
  [3,4,11.5,-.25,14,10.494,-.25,9.495,10.84,-.25,9.53],
// 4 4 9.414 -.25 9.187 10.494 -.25 9.495 11.5 -.25 14 10 -.25 14.75
  [4,4,9.414,-.25,9.187,10.494,-.25,9.495,11.5,-.25,14,10,-.25,14.75],
// 4 4 8.278 -.25 9.261 9.414 -.25 9.187 10 -.25 14.75 7.187 -.25 9.624
  [4,4,8.278,-.25,9.261,9.414,-.25,9.187,10,-.25,14.75,7.187,-.25,9.624],
// 4 4 7.187 -.25 9.624 10 -.25 14.75 8.5 -.25 15 6.012 -.25 9.007
  [4,4,7.187,-.25,9.624,10,-.25,14.75,8.5,-.25,15,6.012,-.25,9.007],
// 4 4 6.012 -.25 9.007 8.5 -.25 15 1.228 -.25 8.211 2.527 -.25 6.271
  [4,4,6.012,-.25,9.007,8.5,-.25,15,1.228,-.25,8.211,2.527,-.25,6.271],
// 4 4 6.141 -.25 7.459 6.012 -.25 9.007 2.527 -.25 6.271 5.303 -.25 6.701
  [4,4,6.141,-.25,7.459,6.012,-.25,9.007,2.527,-.25,6.271,5.303,-.25,6.701],
// 3 4 6.141 -.25 7.459 5.303 -.25 6.701 5.675 -.25 6.888
  [3,4,6.141,-.25,7.459,5.303,-.25,6.701,5.675,-.25,6.888],
// 3 4 5.303 -.25 6.701 2.527 -.25 6.271 2.8666 -.25 5.528
  [3,4,5.303,-.25,6.701,2.527,-.25,6.271,2.8666,-.25,5.528],
// 3 4 2.527 -.25 6.271 2.688 -.25 5.442 2.8666 -.25 5.528
  [3,4,2.527,-.25,6.271,2.688,-.25,5.442,2.8666,-.25,5.528],
// 3 4 8.5 -.25 15 -.705 -.25 9.51 1.228 -.25 8.211
  [3,4,8.5,-.25,15,-.705,-.25,9.51,1.228,-.25,8.211],
// 3 4 8.5 -.25 15 -2.996 -.25 9.967 -.705 -.25 9.51
  [3,4,8.5,-.25,15,-2.996,-.25,9.967,-.705,-.25,9.51],
// 4 4 -8.522 -.25 1.701 -8.6766 -.25 2.4859 -9.679 -.25 1.914 -9.279 -.25 1.05
  [4,4,-8.522,-.25,1.701,-8.6766,-.25,2.4859,-9.679,-.25,1.914,-9.279,-.25,1.05],
// 3 4 -8.522 -.25 1.701 -9.279 -.25 1.05 -8.264 -.25 1.312
  [3,4,-8.522,-.25,1.701,-9.279,-.25,1.05,-8.264,-.25,1.312],
// 4 4 -10.046 -.25 .988 -9.279 -.25 1.05 -9.679 -.25 1.914 -10.526 -.25 1.309
  [4,4,-10.046,-.25,.988,-9.279,-.25,1.05,-9.679,-.25,1.914,-10.526,-.25,1.309],
// 4 4 -10.535 -.25 .969 -10.046 -.25 .988 -10.526 -.25 1.309 -10.632 -.25 1.137
  [4,4,-10.535,-.25,.969,-10.046,-.25,.988,-10.526,-.25,1.309,-10.632,-.25,1.137],
];
makepoly(ldraw_lib__199014a(), line=0.2);
